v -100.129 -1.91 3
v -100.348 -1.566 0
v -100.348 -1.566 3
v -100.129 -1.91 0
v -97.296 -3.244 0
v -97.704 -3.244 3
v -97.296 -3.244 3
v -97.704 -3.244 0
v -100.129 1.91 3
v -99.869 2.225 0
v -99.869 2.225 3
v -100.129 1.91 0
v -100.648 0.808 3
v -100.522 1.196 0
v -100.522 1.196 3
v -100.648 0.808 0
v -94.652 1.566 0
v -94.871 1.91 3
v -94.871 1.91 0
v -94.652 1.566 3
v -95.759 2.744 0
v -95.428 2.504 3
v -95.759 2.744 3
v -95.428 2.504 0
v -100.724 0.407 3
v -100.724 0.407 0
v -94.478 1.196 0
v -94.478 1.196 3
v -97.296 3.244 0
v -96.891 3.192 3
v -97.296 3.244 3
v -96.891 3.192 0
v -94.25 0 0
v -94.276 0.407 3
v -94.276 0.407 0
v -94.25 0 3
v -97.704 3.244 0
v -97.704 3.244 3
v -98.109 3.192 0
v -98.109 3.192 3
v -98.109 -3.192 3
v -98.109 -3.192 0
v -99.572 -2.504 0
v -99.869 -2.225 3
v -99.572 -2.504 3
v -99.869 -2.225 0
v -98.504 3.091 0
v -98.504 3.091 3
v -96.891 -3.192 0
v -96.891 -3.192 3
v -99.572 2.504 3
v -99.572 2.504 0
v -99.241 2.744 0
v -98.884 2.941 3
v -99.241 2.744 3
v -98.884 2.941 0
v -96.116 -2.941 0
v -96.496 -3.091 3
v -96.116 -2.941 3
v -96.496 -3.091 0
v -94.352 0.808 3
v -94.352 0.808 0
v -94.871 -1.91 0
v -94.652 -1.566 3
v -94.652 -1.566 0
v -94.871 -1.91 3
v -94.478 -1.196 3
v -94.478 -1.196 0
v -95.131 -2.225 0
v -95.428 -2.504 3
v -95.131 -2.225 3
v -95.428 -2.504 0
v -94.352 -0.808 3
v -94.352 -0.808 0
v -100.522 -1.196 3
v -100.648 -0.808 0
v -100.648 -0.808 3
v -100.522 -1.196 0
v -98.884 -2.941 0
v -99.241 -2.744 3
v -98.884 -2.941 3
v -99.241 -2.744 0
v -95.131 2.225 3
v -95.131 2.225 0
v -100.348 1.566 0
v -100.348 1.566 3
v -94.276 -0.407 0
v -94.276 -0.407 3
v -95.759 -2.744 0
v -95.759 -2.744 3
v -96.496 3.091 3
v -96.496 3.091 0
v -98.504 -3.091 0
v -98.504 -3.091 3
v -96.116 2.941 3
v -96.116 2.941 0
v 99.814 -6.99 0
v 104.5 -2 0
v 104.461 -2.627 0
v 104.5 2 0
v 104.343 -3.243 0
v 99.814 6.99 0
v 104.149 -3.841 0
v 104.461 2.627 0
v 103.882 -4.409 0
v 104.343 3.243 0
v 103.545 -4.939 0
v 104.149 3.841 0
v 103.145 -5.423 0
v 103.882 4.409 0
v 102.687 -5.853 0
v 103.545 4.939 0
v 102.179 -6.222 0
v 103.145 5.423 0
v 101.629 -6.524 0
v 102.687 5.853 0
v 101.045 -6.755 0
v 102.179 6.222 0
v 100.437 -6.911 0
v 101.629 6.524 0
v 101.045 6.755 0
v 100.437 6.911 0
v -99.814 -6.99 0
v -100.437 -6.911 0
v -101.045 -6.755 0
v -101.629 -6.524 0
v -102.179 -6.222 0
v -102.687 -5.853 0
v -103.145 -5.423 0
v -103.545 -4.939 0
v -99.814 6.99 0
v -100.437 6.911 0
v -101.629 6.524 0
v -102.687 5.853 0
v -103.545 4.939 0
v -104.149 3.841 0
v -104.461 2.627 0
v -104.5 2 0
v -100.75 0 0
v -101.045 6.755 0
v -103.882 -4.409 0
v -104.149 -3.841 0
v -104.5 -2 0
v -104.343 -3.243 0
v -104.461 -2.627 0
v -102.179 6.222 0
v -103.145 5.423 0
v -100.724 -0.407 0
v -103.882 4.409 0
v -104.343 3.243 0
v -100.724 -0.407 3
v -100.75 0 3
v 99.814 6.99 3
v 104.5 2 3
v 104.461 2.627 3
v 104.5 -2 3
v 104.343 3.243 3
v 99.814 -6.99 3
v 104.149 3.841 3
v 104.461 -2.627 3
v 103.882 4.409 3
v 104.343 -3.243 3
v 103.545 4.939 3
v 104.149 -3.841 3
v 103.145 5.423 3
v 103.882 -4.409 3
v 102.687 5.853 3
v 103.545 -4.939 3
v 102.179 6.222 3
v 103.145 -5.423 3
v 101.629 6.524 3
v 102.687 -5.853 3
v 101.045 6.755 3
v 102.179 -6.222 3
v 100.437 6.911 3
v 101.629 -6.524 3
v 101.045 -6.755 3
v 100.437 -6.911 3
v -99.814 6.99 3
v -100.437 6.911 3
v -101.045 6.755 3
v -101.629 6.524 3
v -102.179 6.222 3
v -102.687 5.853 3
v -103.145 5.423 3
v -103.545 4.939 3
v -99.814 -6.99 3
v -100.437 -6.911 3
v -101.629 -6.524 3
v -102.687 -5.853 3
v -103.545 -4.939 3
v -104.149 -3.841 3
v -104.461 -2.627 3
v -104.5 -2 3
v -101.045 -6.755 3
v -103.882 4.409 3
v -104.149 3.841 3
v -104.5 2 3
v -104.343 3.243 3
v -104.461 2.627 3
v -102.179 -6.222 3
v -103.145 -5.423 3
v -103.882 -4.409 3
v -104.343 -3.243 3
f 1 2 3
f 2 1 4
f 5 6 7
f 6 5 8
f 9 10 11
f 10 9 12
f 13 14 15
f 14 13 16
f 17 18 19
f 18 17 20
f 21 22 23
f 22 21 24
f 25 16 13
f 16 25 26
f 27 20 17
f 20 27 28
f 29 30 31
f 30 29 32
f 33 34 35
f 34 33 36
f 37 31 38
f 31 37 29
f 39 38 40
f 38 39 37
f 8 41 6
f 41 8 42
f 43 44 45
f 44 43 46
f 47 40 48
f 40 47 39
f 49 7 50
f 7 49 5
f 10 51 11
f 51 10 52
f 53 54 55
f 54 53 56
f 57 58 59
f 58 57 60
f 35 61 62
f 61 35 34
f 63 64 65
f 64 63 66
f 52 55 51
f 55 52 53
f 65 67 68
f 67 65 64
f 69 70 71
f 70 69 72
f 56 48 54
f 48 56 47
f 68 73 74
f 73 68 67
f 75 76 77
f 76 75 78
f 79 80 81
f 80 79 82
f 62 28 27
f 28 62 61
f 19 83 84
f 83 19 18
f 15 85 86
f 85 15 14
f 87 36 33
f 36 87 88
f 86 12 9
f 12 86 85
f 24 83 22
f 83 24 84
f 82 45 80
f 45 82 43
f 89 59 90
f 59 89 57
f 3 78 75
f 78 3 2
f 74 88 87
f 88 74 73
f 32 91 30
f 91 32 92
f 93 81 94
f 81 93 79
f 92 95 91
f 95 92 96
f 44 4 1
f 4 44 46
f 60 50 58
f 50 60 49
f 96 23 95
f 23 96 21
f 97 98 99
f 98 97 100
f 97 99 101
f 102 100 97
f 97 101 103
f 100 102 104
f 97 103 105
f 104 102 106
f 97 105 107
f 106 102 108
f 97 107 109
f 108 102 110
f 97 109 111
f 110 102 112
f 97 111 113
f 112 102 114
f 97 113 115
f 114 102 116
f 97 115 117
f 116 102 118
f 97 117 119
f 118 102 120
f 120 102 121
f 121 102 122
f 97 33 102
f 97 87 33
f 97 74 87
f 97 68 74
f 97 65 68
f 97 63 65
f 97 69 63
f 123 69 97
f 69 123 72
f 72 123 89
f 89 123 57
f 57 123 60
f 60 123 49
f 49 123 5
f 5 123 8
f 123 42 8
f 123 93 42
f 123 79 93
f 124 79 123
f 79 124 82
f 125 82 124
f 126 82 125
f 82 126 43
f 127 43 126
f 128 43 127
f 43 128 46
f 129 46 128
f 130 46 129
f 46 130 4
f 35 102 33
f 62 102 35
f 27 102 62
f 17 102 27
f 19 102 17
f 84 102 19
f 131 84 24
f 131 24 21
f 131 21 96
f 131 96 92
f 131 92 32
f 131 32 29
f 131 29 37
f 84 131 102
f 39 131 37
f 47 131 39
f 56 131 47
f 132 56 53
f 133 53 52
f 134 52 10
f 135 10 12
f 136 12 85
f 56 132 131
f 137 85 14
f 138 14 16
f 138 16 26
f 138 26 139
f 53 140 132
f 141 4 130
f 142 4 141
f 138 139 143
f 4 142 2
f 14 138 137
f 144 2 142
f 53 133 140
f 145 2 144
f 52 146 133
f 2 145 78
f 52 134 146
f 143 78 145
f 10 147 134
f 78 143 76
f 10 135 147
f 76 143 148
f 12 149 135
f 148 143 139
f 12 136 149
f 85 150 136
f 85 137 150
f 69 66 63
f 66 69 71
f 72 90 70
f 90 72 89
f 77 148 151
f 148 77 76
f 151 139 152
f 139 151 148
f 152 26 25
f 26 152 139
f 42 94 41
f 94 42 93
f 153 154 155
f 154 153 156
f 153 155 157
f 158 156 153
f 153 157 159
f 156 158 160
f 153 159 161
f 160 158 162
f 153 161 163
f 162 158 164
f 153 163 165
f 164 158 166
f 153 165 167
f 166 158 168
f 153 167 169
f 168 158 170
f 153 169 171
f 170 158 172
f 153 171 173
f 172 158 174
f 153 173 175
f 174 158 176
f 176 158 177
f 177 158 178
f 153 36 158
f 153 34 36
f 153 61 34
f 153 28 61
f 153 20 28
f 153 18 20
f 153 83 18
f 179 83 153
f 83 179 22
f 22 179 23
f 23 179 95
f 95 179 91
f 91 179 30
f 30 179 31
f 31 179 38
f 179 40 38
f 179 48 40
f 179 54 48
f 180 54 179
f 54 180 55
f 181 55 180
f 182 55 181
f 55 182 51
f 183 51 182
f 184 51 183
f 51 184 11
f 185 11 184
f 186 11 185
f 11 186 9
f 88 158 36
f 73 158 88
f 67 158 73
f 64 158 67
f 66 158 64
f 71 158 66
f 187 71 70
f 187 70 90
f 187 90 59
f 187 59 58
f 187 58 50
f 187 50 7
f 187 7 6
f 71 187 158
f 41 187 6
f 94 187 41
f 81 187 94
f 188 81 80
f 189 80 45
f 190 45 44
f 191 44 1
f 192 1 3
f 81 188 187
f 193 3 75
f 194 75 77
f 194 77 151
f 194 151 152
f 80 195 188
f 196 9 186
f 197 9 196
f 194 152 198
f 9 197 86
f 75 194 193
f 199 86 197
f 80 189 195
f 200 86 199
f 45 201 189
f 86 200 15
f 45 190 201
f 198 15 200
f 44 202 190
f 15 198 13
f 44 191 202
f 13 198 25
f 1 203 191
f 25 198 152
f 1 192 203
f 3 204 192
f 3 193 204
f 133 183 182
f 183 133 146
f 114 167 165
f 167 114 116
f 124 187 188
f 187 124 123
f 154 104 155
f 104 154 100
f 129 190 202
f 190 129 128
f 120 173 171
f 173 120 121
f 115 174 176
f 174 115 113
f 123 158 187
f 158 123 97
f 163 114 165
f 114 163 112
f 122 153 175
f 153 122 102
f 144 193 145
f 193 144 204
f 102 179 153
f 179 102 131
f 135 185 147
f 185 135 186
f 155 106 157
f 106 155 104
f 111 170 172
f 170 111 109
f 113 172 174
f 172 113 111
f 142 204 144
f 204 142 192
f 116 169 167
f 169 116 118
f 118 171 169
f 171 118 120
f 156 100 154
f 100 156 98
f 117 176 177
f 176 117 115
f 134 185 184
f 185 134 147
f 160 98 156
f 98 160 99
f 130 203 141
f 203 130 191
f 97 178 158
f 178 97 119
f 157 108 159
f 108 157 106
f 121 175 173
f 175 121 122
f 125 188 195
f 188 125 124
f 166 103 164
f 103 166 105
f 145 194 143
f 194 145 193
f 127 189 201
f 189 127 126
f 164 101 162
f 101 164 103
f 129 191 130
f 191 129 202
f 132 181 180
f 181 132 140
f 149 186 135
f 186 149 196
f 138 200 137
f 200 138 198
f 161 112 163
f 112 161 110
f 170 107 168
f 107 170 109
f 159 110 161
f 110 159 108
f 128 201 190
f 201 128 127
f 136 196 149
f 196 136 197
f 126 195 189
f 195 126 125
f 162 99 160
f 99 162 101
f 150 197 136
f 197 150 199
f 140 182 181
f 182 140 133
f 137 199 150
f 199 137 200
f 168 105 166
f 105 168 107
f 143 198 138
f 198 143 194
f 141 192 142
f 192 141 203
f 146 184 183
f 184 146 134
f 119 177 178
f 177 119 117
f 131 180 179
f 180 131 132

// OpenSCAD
$fn = 50;


difference() {
	union() {
		hull() {
			translate(v = [-99.5000000000, 2.0000000000, 0]) {
				cylinder(h = 3, r = 5);
			}
			translate(v = [99.5000000000, 2.0000000000, 0]) {
				cylinder(h = 3, r = 5);
			}
			translate(v = [-99.5000000000, -2.0000000000, 0]) {
				cylinder(h = 3, r = 5);
			}
			translate(v = [99.5000000000, -2.0000000000, 0]) {
				cylinder(h = 3, r = 5);
			}
		}
	}
	union() {
		translate(v = [-97.5000000000, 0.0000000000, 0]) {
			cylinder(h = 3, r = 3.2500000000);
		}
		translate(v = [-97.5000000000, 0.0000000000, 0]) {
			cylinder(h = 3, r = 1.8000000000);
		}
		translate(v = [-97.5000000000, 0.0000000000, 0]) {
			cylinder(h = 3, r = 1.8000000000);
		}
		translate(v = [-97.5000000000, 0.0000000000, 0]) {
			cylinder(h = 3, r = 1.8000000000);
		}
	}
}
